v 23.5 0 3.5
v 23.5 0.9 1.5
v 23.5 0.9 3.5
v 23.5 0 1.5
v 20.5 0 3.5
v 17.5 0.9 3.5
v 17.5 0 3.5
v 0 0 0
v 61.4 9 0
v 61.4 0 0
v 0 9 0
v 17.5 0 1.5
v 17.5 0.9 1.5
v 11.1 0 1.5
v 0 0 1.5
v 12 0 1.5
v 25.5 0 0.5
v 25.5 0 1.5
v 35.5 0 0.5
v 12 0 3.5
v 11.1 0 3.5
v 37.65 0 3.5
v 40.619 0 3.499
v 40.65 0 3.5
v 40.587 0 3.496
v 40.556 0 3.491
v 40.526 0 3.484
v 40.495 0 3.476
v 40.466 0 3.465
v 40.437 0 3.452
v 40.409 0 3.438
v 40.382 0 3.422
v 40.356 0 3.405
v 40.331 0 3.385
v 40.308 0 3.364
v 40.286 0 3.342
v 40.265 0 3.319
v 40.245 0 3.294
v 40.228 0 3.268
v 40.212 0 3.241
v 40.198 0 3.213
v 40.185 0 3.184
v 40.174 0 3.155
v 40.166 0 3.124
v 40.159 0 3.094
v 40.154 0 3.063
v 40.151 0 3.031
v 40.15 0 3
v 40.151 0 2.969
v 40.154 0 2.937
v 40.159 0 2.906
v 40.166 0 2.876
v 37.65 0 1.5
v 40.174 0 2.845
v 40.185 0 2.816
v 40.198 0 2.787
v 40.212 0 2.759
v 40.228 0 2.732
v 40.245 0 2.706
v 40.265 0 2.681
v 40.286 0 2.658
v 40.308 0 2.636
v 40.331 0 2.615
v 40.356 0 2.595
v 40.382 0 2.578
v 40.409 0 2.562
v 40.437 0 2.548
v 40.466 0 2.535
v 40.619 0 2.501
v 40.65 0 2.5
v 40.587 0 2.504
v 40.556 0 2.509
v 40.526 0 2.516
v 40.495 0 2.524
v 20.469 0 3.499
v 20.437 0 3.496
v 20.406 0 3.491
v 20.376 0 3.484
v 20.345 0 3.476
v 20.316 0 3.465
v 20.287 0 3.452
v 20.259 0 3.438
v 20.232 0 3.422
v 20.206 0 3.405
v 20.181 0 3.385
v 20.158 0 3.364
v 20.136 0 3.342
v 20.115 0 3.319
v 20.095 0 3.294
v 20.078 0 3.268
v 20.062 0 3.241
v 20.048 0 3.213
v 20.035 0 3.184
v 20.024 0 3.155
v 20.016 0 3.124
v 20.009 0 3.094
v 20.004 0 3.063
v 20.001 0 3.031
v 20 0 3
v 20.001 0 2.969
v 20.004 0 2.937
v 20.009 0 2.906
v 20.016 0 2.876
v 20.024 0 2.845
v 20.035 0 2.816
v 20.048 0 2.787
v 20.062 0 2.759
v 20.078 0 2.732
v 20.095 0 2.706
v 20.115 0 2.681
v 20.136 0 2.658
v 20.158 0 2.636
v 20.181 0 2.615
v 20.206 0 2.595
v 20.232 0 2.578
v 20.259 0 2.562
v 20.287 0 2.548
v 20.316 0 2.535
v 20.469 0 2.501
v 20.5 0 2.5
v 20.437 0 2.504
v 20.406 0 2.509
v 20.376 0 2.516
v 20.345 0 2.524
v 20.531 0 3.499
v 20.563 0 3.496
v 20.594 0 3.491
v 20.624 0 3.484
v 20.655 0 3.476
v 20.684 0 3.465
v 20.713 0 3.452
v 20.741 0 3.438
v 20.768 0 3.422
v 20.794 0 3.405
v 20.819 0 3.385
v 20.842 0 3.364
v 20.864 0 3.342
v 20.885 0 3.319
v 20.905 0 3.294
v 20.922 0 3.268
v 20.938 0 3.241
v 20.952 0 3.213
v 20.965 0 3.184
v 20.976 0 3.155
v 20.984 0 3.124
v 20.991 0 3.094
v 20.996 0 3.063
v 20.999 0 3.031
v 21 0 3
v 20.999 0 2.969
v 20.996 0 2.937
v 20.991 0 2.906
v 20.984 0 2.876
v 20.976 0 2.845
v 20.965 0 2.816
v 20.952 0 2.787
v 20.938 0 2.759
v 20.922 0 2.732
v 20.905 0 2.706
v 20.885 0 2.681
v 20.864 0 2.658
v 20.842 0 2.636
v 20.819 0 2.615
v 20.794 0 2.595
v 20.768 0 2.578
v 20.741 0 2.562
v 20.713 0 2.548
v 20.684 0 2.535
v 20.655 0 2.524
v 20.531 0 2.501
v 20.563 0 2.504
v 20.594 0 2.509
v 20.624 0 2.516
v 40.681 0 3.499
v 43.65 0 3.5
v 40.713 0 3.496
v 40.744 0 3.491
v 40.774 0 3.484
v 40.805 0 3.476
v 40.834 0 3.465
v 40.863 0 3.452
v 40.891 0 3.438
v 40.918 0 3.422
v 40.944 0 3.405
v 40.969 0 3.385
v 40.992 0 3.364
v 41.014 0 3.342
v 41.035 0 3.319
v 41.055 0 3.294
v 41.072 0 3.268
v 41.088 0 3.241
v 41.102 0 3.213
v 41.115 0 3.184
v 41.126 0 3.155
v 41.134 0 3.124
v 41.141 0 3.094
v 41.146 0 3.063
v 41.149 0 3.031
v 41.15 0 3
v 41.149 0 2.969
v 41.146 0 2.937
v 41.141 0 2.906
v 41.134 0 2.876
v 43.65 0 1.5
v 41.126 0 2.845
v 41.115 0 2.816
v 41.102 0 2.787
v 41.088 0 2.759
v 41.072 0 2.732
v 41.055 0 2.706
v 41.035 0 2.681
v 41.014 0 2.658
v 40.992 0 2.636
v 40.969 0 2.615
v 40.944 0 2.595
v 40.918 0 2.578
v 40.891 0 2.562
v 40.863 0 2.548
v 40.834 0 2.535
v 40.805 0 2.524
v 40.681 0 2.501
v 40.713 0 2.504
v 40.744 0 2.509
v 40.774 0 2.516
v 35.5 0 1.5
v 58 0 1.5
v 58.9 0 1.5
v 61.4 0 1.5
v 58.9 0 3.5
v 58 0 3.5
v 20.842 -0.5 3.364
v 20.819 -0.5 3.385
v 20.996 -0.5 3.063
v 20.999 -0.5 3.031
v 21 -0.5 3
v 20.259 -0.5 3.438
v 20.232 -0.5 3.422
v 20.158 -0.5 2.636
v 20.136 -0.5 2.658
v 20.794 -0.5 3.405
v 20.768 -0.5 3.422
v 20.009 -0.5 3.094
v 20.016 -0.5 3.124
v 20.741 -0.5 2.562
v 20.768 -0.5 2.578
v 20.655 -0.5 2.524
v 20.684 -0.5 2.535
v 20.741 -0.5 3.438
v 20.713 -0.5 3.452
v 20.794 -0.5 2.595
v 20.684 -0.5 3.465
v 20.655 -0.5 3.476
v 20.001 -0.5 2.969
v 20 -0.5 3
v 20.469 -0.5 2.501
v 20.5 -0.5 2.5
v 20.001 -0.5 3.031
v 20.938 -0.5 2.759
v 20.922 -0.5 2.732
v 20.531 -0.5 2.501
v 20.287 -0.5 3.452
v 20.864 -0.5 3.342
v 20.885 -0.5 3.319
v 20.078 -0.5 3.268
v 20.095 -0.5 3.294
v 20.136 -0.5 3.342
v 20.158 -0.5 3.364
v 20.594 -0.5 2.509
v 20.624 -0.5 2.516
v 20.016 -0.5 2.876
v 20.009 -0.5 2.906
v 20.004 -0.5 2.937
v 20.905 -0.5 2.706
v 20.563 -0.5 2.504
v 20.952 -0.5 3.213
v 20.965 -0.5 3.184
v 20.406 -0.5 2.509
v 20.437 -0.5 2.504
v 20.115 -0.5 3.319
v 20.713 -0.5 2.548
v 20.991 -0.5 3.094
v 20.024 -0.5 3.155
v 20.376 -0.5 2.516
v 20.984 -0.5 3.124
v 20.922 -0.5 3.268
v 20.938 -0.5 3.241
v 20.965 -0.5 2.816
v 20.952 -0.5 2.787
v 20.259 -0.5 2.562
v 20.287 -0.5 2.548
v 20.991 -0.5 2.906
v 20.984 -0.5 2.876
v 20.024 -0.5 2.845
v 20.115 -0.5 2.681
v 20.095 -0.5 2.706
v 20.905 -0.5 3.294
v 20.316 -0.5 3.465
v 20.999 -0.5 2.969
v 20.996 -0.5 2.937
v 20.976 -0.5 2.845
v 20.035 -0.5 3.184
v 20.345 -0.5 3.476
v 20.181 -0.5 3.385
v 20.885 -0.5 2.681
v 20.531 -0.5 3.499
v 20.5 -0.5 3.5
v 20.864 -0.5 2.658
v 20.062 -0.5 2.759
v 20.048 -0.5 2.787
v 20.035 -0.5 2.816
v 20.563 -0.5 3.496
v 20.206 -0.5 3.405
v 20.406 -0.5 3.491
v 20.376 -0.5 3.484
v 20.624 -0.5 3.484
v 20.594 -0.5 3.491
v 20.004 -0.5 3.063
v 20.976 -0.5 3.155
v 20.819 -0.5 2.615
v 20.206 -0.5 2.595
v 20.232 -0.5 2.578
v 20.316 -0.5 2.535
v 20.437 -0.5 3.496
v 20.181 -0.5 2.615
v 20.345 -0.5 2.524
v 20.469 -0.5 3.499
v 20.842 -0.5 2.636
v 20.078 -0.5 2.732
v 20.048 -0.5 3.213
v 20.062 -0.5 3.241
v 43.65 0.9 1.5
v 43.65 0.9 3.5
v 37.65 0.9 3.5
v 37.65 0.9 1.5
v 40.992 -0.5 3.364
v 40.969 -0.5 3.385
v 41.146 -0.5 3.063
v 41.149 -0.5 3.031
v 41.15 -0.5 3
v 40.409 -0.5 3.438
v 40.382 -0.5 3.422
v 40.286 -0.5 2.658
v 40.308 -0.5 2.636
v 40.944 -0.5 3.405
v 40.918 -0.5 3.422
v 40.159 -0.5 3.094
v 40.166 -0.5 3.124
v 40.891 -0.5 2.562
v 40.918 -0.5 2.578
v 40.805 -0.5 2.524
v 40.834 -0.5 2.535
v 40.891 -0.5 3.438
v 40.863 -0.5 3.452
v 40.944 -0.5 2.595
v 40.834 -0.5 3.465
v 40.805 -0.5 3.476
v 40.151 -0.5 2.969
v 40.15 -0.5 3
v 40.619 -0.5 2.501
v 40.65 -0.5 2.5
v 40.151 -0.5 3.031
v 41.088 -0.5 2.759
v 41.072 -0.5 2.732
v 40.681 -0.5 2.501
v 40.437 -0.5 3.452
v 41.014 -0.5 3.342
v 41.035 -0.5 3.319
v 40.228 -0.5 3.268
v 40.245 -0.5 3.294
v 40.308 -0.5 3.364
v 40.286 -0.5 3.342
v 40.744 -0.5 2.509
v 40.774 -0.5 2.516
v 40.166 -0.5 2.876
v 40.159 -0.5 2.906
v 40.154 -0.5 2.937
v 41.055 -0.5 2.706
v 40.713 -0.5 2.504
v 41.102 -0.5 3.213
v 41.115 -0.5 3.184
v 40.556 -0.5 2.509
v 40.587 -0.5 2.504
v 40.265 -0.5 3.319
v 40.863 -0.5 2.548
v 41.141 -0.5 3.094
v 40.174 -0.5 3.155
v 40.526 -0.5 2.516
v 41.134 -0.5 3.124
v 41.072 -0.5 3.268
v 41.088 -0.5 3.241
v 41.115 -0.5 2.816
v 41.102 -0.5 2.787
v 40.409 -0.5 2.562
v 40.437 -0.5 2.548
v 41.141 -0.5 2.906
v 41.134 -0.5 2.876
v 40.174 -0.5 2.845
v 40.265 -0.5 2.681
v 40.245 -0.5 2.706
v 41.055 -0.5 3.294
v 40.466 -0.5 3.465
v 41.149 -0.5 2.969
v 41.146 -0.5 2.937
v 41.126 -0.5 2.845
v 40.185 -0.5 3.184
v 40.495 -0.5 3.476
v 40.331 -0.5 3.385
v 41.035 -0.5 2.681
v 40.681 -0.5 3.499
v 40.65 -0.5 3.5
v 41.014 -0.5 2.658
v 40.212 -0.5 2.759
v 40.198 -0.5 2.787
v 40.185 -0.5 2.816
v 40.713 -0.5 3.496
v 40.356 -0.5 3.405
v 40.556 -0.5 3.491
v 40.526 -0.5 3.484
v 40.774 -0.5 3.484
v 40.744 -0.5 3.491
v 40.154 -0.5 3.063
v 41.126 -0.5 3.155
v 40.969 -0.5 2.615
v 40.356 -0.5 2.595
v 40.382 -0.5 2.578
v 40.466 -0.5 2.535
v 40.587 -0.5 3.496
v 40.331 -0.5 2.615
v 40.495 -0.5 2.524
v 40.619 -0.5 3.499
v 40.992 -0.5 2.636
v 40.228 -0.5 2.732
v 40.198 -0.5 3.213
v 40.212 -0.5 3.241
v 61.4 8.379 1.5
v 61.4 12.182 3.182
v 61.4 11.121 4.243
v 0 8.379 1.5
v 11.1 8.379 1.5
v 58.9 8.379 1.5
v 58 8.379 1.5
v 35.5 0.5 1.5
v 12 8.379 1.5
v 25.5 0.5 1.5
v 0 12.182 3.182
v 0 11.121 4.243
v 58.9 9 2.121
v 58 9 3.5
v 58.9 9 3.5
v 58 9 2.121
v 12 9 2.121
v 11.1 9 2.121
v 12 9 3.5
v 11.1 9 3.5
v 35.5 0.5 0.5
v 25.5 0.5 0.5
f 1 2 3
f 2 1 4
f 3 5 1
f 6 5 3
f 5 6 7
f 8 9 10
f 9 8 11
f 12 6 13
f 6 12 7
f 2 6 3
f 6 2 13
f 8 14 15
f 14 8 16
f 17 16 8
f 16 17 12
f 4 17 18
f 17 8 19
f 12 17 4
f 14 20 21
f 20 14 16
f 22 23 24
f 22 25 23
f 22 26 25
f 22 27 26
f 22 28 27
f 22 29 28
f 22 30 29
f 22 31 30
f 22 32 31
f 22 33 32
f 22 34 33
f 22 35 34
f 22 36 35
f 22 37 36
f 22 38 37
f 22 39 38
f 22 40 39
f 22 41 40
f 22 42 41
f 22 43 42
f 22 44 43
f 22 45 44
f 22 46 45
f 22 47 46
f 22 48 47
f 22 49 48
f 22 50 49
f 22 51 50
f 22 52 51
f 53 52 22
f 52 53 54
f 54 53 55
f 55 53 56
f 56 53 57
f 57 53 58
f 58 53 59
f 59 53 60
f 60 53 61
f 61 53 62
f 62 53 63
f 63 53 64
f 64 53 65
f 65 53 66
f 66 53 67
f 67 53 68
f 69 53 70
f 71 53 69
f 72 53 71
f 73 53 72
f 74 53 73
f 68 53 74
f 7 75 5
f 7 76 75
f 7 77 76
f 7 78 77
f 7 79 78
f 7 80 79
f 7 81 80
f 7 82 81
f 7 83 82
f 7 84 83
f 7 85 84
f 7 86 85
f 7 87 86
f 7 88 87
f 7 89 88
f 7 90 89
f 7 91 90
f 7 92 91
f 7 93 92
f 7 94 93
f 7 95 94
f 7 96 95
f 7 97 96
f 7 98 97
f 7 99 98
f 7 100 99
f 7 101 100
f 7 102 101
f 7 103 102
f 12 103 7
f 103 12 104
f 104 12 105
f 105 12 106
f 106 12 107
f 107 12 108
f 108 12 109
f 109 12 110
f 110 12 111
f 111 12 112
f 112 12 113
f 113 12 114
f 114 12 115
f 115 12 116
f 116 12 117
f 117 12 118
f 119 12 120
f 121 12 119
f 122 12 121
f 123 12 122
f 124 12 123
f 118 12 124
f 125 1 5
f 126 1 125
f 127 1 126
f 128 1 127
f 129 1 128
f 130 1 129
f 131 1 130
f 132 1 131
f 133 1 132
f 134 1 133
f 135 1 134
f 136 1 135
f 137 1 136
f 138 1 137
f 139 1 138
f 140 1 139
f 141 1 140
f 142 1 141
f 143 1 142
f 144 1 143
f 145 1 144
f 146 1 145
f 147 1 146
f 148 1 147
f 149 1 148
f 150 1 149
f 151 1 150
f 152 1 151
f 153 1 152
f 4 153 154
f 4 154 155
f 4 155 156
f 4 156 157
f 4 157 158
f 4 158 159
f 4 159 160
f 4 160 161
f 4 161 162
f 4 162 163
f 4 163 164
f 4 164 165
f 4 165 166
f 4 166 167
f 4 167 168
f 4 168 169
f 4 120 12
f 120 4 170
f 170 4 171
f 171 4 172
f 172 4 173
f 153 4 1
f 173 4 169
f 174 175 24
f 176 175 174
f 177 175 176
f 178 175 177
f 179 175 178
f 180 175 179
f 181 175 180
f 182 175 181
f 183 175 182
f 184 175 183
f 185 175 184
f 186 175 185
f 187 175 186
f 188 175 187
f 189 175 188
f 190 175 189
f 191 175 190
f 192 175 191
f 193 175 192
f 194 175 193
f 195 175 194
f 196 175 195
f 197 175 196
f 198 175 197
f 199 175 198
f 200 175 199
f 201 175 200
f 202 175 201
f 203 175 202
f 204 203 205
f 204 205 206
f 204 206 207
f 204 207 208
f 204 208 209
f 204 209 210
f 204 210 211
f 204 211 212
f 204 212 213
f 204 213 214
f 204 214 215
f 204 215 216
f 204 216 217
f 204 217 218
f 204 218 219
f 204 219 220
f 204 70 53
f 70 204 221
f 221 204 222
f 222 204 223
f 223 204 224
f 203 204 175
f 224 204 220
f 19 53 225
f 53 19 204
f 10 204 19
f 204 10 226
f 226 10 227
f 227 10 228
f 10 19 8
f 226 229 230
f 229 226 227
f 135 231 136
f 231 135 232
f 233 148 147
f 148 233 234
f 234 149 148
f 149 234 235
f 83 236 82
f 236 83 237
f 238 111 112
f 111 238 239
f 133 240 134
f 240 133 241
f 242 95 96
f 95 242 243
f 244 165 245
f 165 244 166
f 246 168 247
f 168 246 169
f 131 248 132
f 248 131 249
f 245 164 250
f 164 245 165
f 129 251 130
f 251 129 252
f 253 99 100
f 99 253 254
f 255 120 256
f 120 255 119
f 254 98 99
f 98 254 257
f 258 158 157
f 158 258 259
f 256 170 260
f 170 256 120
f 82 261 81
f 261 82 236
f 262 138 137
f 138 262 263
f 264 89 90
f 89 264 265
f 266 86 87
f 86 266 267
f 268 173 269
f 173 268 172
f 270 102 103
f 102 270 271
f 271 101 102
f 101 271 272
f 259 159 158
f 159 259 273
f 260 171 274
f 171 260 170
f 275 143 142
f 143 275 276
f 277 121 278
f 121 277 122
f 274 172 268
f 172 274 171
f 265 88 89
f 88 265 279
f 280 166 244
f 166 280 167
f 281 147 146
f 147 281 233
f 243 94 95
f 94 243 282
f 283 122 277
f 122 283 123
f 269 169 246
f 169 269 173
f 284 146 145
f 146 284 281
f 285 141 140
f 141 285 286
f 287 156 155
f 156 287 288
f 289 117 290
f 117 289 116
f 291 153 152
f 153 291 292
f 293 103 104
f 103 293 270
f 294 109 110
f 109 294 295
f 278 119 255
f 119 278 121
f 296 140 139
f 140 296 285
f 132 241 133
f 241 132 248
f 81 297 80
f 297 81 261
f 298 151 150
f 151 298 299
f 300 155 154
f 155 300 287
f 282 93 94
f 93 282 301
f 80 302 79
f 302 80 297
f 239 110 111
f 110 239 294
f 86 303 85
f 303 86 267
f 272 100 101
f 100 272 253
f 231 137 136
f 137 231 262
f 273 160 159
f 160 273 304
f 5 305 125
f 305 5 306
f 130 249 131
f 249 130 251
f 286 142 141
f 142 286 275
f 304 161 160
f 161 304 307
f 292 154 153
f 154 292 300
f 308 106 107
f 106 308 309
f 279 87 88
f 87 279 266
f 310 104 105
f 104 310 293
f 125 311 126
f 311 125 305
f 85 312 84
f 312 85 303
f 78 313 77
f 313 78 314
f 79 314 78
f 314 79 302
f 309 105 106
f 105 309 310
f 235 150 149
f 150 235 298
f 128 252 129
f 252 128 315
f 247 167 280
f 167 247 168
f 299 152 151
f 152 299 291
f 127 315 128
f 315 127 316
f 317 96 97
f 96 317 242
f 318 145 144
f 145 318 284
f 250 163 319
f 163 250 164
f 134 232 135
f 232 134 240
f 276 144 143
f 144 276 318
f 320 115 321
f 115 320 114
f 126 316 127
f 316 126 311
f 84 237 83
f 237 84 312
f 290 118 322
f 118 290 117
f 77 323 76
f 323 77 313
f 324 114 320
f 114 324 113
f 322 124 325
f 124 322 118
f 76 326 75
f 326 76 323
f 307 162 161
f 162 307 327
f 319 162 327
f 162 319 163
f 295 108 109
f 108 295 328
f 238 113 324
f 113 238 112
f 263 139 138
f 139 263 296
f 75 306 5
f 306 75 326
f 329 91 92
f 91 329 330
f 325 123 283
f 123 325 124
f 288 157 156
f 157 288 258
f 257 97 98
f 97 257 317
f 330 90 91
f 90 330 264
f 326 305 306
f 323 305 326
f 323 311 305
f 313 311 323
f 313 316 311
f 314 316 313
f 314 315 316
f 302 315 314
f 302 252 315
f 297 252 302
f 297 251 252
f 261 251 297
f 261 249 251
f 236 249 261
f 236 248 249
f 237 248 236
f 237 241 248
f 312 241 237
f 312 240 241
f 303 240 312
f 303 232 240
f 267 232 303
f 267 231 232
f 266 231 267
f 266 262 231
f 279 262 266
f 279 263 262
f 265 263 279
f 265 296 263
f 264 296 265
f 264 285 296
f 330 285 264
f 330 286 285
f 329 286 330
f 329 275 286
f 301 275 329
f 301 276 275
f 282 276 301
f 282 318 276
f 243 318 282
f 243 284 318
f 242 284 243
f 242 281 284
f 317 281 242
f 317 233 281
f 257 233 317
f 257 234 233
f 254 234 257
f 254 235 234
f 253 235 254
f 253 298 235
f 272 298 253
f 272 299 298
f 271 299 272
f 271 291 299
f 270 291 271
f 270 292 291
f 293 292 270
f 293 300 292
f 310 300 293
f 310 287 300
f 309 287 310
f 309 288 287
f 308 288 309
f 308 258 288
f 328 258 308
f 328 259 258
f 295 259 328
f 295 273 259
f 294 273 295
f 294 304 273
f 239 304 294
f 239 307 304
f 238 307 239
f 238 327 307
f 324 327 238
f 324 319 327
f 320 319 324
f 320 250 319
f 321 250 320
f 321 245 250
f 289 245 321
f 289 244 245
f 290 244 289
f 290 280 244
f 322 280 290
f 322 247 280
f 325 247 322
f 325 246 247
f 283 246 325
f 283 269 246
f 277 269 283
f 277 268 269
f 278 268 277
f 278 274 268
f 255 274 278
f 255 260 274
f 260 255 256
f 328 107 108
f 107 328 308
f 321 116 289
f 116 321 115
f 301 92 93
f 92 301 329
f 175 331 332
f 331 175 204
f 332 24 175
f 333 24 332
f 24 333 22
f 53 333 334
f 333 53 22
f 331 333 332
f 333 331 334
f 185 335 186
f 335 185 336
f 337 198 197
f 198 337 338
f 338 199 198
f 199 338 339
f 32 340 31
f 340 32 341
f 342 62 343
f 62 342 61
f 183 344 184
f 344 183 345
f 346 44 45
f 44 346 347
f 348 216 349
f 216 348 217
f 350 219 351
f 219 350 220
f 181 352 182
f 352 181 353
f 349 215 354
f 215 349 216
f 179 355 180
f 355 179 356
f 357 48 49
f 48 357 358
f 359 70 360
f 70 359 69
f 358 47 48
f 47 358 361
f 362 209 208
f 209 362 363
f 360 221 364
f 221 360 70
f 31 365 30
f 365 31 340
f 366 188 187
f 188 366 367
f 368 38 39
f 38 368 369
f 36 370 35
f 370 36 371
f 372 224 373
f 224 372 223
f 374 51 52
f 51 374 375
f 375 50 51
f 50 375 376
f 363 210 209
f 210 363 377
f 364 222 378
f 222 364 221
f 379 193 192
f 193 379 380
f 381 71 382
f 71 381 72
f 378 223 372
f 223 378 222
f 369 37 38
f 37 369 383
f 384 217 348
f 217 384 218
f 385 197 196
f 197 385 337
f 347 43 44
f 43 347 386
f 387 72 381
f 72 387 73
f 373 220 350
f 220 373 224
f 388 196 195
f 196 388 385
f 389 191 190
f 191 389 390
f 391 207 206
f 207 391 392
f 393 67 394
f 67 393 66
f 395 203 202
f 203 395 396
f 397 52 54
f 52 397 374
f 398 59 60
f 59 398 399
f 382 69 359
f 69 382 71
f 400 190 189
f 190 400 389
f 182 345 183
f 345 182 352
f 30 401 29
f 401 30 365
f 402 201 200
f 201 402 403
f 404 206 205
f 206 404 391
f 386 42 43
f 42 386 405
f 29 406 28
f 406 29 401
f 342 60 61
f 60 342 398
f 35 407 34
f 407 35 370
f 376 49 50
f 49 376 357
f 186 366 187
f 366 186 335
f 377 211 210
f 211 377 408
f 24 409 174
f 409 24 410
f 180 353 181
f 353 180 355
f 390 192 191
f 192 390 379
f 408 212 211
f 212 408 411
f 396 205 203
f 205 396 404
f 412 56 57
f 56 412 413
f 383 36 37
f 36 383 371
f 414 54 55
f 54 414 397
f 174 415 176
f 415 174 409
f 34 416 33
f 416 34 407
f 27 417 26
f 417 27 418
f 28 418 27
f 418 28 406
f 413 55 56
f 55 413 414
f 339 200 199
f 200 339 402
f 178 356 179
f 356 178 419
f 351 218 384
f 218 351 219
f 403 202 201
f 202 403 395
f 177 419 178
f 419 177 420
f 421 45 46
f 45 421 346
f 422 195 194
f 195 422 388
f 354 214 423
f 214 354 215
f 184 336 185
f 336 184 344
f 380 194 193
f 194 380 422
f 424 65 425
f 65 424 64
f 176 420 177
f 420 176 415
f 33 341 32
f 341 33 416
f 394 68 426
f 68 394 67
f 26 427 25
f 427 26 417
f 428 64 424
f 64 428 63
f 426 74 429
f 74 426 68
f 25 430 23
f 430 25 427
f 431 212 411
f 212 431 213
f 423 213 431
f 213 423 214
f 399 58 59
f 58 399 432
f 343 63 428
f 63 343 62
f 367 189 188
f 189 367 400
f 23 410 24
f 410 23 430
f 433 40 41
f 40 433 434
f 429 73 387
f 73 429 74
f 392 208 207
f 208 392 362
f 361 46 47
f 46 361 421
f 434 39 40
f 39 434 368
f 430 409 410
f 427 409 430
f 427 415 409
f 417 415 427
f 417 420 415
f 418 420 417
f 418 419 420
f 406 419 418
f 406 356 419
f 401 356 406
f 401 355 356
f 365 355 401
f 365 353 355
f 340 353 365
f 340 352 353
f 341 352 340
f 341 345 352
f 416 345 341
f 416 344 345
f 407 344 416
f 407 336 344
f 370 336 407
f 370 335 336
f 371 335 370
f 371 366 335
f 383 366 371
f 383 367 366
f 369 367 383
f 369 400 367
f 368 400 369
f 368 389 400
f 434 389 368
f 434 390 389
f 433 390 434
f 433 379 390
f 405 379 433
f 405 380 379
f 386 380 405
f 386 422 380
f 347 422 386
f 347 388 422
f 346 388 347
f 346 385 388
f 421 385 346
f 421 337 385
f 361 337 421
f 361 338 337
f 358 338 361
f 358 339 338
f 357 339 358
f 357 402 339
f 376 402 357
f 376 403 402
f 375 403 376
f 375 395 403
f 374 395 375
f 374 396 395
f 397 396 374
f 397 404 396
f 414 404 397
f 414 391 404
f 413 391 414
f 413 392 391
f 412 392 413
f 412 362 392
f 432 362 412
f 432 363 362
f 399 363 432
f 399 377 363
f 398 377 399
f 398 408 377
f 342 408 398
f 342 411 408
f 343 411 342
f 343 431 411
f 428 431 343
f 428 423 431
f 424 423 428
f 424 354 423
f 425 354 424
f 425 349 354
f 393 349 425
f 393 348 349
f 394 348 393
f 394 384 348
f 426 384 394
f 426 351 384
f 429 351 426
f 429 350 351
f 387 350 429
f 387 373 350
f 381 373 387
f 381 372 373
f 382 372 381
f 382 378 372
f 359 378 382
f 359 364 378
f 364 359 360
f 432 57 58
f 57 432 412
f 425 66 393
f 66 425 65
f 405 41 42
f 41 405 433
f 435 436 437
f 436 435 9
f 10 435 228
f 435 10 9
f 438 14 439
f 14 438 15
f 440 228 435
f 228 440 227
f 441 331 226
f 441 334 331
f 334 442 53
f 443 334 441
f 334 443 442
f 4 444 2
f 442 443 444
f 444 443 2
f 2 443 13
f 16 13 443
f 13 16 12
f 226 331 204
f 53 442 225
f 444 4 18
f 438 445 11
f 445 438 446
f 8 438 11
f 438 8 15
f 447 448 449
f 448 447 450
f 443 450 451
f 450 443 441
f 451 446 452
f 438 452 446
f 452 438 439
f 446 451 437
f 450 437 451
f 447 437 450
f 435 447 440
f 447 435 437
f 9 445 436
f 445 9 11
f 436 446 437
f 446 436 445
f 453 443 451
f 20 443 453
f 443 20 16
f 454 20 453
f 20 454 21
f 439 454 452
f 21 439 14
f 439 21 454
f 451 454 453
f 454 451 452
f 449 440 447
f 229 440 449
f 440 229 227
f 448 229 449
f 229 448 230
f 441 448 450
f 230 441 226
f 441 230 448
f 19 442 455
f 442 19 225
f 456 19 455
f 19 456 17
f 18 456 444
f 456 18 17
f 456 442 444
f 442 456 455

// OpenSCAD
width = 61.4;
height = 14.75;
depth = 9;
thickness = 1.5;

$fn = $preview ? 12 : 100;

module door_angle() {
    linear_extrude(0.45)
    intersection() {
        circle(7);

    polygon([[0,0],[7,0],[7,-7],[2,-4],[3.5,-2.75],[0,-2.75]]);
    
    }
}

module door_nipple() {
    rotate([0,90,0])
        cylinder(d=1.5,h=2.35);
}

module door_angle_holder() {
    cube([0.9,9,3.5]);
}

module clip() {
    cube([6,0.9,3.5]);

    translate([3,0.9,3])
        rotate([90,0,0])
            cylinder(d = 1, h = 1.4);
}

module fingernail() {
    translate([25.5,-1,0.5])
        cube([10,0.5+1,1+1]);
}

module door_solid() {
    cube([width,9,thickness]);

    translate([0,9,0])
        rotate([45,0,0])
            cube([width,4.5,thickness]);

    translate([17.5,0,0])
        clip();

    translate([width-23.75,0,0])
        clip();

    // left
    translate([11.1,0,0])
        door_angle_holder();

    * translate([11.1,0,0])
        door_angle();

    * translate([11.1-1.4,height,depth])
        door_nipple();

    translate([width-3.4,0,0])
        door_angle_holder();

    * translate([width-3.4,0,0])
        door_angle();

    * translate([width-3.4,height,depth])
        door_nipple();
}

difference() {
    door_solid();

    fingernail();
}
